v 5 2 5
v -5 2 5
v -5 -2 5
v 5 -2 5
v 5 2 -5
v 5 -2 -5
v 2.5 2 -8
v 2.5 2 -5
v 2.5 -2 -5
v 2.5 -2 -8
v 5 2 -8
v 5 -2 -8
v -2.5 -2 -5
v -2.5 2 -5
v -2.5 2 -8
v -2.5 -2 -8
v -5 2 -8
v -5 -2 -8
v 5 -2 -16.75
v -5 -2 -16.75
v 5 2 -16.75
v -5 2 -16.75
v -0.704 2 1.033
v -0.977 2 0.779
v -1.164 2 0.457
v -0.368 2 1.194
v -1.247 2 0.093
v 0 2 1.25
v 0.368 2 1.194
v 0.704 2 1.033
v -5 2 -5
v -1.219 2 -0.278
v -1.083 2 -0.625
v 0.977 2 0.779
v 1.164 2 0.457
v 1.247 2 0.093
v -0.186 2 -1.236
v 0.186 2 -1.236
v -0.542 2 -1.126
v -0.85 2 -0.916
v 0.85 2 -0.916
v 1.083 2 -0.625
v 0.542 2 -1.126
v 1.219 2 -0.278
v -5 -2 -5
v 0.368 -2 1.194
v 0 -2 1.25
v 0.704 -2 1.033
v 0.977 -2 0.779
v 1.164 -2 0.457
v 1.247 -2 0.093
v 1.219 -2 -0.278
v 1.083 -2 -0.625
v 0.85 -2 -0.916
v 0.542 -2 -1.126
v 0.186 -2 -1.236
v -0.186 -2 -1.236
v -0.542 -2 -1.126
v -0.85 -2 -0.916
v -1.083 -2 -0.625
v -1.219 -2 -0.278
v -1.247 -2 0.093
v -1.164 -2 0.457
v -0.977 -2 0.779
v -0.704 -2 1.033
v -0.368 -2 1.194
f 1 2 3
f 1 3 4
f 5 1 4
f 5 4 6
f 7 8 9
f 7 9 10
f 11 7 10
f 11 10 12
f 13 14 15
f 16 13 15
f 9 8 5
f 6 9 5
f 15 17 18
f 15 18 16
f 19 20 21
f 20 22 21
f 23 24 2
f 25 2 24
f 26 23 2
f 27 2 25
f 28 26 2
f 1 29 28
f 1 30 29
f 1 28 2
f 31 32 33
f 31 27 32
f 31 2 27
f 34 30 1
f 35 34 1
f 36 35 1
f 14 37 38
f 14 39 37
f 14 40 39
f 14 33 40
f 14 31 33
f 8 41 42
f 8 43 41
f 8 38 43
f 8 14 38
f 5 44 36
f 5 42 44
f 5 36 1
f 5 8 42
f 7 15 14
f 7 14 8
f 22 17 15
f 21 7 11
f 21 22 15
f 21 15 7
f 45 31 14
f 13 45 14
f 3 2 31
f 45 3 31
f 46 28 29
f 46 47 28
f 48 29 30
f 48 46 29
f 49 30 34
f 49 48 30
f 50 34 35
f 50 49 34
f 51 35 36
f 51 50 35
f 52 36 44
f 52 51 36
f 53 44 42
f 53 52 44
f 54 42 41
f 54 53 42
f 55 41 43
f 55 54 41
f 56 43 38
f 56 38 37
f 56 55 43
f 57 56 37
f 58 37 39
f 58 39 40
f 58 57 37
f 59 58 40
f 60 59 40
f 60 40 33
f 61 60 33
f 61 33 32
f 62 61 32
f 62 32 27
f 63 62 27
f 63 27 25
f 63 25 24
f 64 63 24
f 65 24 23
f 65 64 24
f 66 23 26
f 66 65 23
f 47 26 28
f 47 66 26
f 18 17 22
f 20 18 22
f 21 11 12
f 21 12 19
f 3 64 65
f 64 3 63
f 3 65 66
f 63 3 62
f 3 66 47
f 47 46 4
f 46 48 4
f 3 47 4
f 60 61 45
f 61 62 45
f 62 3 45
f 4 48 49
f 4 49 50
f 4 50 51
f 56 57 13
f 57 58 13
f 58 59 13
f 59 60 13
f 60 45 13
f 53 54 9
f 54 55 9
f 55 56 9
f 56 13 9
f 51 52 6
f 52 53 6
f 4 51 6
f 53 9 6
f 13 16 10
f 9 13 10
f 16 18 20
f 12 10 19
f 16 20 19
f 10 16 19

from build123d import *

# Parameters (mm, degrees)
SKETCH1_W           = 10
SKETCH1_H           = 10
SKETCH1_R           = 1.25
BOSS_EXTRUDE1_DEPTH = 2
SKETCH2_W           = 5
SKETCH2_H           = 3
BOSS_EXTRUDE2_DEPTH = 2
SKETCH3_W           = 10
SKETCH3_H           = 8.75
BOSS_EXTRUDE3_DEPTH = 2


with BuildPart() as part:
    # Sketch1 → Boss-Extrude1 (new, symmetric)
    with BuildSketch(Plane(origin=(0, 0, 0), x_dir=(1, 0, 0), z_dir=(0, 1, 0))):
        Rectangle(SKETCH1_W, SKETCH1_H)
        with Locations(Location((0, 0, 0), (0, 0, 270))):
            Circle(SKETCH1_R, mode=Mode.SUBTRACT)
    extrude(amount=BOSS_EXTRUDE1_DEPTH, both=True)

    # Sketch2 → Boss-Extrude2 (add, symmetric)
    with BuildSketch(Plane(origin=(0, 0, 0), x_dir=(1, 0, 0), z_dir=(0, 1, 0))):
        with Locations((0, 6.5)):
            Rectangle(SKETCH2_W, SKETCH2_H)
    extrude(amount=BOSS_EXTRUDE2_DEPTH, both=True)

    # Sketch3 → Boss-Extrude3 (add, symmetric)
    with BuildSketch(Plane(origin=(0, 0, 0), x_dir=(1, 0, 0), z_dir=(0, 1, 0))):
        with Locations((0, 12.375)):
            Rectangle(SKETCH3_W, SKETCH3_H)
    extrude(amount=BOSS_EXTRUDE3_DEPTH, both=True)


solid = part.part
